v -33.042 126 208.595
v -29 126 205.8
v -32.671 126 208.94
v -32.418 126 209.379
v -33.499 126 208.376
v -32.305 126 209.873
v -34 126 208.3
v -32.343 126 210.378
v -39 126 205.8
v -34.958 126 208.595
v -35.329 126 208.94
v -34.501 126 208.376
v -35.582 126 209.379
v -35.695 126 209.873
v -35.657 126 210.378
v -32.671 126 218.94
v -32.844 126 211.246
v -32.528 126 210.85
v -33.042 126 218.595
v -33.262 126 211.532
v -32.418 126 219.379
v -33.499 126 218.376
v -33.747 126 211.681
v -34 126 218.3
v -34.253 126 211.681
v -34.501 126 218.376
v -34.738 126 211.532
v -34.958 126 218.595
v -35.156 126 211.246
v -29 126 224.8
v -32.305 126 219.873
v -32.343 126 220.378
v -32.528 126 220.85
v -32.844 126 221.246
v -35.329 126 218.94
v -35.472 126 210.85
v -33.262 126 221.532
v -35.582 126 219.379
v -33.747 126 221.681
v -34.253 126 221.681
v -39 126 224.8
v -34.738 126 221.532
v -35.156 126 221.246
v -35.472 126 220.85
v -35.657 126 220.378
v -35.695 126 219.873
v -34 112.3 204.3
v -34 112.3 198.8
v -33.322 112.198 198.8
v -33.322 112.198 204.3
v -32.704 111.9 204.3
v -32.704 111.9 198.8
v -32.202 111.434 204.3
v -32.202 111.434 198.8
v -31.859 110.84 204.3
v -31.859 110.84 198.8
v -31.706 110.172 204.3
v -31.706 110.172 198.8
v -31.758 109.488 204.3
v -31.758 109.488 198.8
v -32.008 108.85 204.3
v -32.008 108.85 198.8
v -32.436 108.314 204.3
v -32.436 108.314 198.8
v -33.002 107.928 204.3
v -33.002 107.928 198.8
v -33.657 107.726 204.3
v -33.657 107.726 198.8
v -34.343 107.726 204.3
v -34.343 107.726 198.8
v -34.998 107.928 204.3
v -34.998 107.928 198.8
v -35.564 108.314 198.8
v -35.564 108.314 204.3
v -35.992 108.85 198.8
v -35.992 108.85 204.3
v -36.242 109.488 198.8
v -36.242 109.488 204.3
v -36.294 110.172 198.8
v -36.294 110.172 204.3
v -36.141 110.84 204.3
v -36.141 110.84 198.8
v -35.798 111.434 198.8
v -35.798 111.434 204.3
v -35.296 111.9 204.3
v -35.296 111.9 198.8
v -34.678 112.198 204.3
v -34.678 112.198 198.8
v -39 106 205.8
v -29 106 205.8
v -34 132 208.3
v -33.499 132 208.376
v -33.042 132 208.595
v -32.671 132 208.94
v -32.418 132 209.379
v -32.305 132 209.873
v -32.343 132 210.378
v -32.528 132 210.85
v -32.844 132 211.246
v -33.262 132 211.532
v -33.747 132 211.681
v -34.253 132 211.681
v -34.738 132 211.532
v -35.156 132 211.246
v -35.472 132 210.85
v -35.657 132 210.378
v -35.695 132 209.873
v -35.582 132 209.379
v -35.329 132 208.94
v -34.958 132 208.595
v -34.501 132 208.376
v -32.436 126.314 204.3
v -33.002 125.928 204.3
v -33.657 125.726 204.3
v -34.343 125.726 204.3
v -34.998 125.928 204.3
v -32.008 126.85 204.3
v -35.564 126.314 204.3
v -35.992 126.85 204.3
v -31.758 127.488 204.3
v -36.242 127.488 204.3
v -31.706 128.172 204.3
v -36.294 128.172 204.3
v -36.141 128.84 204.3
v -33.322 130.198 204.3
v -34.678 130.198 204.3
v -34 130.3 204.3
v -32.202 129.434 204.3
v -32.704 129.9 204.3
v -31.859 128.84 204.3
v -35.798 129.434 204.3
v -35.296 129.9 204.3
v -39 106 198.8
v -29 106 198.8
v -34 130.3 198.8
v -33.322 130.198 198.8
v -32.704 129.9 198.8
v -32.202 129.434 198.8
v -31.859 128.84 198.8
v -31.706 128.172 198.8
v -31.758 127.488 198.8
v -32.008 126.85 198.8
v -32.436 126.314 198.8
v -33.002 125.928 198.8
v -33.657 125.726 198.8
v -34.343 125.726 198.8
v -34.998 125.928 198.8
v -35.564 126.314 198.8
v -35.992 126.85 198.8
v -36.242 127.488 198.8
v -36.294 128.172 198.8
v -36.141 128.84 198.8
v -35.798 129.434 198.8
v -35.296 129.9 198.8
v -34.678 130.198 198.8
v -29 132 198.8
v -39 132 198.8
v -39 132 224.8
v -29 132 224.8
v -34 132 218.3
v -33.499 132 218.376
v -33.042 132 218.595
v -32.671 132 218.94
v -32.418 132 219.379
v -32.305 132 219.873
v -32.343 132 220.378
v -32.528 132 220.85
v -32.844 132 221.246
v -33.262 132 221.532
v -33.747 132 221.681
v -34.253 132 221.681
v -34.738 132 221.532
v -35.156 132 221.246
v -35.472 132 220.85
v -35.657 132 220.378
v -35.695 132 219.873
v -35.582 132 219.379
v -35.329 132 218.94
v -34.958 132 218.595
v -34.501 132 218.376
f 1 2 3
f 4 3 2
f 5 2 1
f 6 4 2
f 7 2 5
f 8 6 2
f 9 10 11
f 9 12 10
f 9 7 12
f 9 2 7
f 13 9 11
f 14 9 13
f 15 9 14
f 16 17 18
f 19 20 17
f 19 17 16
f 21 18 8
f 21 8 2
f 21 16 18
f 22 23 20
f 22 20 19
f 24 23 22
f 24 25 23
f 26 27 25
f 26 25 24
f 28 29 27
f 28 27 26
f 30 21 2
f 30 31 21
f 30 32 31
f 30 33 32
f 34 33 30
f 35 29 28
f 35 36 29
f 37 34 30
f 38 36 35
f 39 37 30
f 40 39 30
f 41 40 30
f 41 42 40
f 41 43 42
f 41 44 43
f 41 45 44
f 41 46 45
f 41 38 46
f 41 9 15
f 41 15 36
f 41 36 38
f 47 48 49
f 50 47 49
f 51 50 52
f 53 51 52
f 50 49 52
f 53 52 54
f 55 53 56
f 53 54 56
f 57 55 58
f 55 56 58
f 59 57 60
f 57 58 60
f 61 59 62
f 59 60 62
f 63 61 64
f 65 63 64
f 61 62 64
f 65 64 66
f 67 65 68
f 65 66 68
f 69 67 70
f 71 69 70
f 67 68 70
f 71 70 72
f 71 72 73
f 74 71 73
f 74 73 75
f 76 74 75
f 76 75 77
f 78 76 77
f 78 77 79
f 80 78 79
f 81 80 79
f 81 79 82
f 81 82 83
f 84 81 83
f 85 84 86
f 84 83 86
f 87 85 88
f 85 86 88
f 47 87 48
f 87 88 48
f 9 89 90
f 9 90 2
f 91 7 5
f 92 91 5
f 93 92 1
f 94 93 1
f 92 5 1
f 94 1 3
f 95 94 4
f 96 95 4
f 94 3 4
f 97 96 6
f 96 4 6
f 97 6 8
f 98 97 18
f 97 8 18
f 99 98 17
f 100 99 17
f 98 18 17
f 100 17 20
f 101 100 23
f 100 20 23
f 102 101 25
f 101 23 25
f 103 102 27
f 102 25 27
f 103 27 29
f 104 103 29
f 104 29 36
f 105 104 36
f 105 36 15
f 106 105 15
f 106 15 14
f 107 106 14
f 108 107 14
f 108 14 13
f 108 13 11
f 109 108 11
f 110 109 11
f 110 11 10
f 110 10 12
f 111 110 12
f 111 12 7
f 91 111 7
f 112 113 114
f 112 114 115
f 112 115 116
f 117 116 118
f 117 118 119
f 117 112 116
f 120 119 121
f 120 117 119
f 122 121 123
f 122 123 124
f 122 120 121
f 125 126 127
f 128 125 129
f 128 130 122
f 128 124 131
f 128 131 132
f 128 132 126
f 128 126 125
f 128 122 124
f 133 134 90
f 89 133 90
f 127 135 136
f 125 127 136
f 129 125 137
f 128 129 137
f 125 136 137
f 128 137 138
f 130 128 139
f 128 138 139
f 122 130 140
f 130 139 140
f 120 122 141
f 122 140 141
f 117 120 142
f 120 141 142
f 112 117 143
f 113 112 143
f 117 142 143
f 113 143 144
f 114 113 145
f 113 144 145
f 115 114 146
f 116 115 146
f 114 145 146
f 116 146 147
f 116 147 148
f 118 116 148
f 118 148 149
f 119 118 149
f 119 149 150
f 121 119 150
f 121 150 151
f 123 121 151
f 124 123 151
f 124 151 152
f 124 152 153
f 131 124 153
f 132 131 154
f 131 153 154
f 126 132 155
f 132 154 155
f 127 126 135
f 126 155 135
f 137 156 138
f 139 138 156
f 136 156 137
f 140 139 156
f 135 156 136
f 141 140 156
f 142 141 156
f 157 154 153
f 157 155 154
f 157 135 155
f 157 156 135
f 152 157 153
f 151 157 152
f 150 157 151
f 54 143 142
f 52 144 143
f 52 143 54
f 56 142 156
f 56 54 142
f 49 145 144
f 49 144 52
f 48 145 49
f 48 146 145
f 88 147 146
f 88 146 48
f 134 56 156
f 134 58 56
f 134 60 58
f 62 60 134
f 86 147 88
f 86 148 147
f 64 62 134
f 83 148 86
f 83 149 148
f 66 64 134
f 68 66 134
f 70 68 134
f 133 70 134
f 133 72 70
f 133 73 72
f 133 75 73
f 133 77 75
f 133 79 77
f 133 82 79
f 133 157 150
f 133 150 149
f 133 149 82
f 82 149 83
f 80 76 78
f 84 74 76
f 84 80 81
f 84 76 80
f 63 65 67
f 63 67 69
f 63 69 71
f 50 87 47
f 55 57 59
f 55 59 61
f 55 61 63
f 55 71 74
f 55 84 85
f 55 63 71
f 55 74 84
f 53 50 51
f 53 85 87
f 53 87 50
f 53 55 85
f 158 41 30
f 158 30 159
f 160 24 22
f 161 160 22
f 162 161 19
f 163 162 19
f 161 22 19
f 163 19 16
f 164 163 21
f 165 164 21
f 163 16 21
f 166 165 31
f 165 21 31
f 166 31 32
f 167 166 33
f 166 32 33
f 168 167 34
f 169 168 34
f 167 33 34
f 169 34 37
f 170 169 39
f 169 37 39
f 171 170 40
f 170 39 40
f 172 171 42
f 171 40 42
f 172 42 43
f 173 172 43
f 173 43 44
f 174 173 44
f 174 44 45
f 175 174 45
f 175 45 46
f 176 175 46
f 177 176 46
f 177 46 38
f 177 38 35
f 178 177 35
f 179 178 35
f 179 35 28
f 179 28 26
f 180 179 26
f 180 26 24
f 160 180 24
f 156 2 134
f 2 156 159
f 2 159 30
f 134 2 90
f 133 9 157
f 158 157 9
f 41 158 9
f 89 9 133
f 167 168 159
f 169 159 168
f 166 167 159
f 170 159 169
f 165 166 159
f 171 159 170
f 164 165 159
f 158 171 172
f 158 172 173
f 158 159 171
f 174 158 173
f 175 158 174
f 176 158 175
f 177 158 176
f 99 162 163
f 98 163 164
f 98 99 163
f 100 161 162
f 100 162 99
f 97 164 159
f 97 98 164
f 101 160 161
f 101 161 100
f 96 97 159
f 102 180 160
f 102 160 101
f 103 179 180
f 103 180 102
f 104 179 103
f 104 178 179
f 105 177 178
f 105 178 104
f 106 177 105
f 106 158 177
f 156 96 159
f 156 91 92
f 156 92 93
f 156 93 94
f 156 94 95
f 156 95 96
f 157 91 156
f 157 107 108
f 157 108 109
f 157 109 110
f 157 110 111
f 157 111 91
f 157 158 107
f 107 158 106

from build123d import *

# Parameters (mm, degrees)
PAD038_DEPTH    = 10
SKETCH109_R     = 2.3
POCKET034_DEPTH = 5.5
SKETCH110_R     = 1.7
HOLE021_DEPTH   = 25


with BuildPart() as part:
    # Sketch108 → Pad038 (new body)
    with BuildSketch(Plane.YZ):
        Polygon((106, 198.8), (106, 205.8), (126, 205.8), (126, 224.8), (132, 224.8), (132, 198.8), align=None)
    extrude(amount=PAD038_DEPTH)

    # Sketch109 (on Face6 of Pad038) → Pocket034 (cut)
    with BuildSketch(Plane.YX.offset(-198.8)):
        with Locations((128, 5)):
            Circle(SKETCH109_R)
        with Locations((110, 5)):
            Circle(SKETCH109_R)
    extrude(amount=-POCKET034_DEPTH, mode=Mode.SUBTRACT)

    # Sketch110 (on Face9 of Pocket034) → Hole021 (cut)
    with BuildSketch(Plane(origin=(0, 126, 0), x_dir=(0, 0, -1), z_dir=(0, -1, 0))):
        with Locations((-220, 5)):
            Circle(SKETCH110_R)
        with Locations((-210, 5)):
            Circle(SKETCH110_R)
    extrude(amount=-HOLE021_DEPTH, mode=Mode.SUBTRACT)


with BuildPart() as part_1:
    # Body015 placement: moved
    add(part.part.moved(Location((-39, 0, 0))))


solid = part_1.part
